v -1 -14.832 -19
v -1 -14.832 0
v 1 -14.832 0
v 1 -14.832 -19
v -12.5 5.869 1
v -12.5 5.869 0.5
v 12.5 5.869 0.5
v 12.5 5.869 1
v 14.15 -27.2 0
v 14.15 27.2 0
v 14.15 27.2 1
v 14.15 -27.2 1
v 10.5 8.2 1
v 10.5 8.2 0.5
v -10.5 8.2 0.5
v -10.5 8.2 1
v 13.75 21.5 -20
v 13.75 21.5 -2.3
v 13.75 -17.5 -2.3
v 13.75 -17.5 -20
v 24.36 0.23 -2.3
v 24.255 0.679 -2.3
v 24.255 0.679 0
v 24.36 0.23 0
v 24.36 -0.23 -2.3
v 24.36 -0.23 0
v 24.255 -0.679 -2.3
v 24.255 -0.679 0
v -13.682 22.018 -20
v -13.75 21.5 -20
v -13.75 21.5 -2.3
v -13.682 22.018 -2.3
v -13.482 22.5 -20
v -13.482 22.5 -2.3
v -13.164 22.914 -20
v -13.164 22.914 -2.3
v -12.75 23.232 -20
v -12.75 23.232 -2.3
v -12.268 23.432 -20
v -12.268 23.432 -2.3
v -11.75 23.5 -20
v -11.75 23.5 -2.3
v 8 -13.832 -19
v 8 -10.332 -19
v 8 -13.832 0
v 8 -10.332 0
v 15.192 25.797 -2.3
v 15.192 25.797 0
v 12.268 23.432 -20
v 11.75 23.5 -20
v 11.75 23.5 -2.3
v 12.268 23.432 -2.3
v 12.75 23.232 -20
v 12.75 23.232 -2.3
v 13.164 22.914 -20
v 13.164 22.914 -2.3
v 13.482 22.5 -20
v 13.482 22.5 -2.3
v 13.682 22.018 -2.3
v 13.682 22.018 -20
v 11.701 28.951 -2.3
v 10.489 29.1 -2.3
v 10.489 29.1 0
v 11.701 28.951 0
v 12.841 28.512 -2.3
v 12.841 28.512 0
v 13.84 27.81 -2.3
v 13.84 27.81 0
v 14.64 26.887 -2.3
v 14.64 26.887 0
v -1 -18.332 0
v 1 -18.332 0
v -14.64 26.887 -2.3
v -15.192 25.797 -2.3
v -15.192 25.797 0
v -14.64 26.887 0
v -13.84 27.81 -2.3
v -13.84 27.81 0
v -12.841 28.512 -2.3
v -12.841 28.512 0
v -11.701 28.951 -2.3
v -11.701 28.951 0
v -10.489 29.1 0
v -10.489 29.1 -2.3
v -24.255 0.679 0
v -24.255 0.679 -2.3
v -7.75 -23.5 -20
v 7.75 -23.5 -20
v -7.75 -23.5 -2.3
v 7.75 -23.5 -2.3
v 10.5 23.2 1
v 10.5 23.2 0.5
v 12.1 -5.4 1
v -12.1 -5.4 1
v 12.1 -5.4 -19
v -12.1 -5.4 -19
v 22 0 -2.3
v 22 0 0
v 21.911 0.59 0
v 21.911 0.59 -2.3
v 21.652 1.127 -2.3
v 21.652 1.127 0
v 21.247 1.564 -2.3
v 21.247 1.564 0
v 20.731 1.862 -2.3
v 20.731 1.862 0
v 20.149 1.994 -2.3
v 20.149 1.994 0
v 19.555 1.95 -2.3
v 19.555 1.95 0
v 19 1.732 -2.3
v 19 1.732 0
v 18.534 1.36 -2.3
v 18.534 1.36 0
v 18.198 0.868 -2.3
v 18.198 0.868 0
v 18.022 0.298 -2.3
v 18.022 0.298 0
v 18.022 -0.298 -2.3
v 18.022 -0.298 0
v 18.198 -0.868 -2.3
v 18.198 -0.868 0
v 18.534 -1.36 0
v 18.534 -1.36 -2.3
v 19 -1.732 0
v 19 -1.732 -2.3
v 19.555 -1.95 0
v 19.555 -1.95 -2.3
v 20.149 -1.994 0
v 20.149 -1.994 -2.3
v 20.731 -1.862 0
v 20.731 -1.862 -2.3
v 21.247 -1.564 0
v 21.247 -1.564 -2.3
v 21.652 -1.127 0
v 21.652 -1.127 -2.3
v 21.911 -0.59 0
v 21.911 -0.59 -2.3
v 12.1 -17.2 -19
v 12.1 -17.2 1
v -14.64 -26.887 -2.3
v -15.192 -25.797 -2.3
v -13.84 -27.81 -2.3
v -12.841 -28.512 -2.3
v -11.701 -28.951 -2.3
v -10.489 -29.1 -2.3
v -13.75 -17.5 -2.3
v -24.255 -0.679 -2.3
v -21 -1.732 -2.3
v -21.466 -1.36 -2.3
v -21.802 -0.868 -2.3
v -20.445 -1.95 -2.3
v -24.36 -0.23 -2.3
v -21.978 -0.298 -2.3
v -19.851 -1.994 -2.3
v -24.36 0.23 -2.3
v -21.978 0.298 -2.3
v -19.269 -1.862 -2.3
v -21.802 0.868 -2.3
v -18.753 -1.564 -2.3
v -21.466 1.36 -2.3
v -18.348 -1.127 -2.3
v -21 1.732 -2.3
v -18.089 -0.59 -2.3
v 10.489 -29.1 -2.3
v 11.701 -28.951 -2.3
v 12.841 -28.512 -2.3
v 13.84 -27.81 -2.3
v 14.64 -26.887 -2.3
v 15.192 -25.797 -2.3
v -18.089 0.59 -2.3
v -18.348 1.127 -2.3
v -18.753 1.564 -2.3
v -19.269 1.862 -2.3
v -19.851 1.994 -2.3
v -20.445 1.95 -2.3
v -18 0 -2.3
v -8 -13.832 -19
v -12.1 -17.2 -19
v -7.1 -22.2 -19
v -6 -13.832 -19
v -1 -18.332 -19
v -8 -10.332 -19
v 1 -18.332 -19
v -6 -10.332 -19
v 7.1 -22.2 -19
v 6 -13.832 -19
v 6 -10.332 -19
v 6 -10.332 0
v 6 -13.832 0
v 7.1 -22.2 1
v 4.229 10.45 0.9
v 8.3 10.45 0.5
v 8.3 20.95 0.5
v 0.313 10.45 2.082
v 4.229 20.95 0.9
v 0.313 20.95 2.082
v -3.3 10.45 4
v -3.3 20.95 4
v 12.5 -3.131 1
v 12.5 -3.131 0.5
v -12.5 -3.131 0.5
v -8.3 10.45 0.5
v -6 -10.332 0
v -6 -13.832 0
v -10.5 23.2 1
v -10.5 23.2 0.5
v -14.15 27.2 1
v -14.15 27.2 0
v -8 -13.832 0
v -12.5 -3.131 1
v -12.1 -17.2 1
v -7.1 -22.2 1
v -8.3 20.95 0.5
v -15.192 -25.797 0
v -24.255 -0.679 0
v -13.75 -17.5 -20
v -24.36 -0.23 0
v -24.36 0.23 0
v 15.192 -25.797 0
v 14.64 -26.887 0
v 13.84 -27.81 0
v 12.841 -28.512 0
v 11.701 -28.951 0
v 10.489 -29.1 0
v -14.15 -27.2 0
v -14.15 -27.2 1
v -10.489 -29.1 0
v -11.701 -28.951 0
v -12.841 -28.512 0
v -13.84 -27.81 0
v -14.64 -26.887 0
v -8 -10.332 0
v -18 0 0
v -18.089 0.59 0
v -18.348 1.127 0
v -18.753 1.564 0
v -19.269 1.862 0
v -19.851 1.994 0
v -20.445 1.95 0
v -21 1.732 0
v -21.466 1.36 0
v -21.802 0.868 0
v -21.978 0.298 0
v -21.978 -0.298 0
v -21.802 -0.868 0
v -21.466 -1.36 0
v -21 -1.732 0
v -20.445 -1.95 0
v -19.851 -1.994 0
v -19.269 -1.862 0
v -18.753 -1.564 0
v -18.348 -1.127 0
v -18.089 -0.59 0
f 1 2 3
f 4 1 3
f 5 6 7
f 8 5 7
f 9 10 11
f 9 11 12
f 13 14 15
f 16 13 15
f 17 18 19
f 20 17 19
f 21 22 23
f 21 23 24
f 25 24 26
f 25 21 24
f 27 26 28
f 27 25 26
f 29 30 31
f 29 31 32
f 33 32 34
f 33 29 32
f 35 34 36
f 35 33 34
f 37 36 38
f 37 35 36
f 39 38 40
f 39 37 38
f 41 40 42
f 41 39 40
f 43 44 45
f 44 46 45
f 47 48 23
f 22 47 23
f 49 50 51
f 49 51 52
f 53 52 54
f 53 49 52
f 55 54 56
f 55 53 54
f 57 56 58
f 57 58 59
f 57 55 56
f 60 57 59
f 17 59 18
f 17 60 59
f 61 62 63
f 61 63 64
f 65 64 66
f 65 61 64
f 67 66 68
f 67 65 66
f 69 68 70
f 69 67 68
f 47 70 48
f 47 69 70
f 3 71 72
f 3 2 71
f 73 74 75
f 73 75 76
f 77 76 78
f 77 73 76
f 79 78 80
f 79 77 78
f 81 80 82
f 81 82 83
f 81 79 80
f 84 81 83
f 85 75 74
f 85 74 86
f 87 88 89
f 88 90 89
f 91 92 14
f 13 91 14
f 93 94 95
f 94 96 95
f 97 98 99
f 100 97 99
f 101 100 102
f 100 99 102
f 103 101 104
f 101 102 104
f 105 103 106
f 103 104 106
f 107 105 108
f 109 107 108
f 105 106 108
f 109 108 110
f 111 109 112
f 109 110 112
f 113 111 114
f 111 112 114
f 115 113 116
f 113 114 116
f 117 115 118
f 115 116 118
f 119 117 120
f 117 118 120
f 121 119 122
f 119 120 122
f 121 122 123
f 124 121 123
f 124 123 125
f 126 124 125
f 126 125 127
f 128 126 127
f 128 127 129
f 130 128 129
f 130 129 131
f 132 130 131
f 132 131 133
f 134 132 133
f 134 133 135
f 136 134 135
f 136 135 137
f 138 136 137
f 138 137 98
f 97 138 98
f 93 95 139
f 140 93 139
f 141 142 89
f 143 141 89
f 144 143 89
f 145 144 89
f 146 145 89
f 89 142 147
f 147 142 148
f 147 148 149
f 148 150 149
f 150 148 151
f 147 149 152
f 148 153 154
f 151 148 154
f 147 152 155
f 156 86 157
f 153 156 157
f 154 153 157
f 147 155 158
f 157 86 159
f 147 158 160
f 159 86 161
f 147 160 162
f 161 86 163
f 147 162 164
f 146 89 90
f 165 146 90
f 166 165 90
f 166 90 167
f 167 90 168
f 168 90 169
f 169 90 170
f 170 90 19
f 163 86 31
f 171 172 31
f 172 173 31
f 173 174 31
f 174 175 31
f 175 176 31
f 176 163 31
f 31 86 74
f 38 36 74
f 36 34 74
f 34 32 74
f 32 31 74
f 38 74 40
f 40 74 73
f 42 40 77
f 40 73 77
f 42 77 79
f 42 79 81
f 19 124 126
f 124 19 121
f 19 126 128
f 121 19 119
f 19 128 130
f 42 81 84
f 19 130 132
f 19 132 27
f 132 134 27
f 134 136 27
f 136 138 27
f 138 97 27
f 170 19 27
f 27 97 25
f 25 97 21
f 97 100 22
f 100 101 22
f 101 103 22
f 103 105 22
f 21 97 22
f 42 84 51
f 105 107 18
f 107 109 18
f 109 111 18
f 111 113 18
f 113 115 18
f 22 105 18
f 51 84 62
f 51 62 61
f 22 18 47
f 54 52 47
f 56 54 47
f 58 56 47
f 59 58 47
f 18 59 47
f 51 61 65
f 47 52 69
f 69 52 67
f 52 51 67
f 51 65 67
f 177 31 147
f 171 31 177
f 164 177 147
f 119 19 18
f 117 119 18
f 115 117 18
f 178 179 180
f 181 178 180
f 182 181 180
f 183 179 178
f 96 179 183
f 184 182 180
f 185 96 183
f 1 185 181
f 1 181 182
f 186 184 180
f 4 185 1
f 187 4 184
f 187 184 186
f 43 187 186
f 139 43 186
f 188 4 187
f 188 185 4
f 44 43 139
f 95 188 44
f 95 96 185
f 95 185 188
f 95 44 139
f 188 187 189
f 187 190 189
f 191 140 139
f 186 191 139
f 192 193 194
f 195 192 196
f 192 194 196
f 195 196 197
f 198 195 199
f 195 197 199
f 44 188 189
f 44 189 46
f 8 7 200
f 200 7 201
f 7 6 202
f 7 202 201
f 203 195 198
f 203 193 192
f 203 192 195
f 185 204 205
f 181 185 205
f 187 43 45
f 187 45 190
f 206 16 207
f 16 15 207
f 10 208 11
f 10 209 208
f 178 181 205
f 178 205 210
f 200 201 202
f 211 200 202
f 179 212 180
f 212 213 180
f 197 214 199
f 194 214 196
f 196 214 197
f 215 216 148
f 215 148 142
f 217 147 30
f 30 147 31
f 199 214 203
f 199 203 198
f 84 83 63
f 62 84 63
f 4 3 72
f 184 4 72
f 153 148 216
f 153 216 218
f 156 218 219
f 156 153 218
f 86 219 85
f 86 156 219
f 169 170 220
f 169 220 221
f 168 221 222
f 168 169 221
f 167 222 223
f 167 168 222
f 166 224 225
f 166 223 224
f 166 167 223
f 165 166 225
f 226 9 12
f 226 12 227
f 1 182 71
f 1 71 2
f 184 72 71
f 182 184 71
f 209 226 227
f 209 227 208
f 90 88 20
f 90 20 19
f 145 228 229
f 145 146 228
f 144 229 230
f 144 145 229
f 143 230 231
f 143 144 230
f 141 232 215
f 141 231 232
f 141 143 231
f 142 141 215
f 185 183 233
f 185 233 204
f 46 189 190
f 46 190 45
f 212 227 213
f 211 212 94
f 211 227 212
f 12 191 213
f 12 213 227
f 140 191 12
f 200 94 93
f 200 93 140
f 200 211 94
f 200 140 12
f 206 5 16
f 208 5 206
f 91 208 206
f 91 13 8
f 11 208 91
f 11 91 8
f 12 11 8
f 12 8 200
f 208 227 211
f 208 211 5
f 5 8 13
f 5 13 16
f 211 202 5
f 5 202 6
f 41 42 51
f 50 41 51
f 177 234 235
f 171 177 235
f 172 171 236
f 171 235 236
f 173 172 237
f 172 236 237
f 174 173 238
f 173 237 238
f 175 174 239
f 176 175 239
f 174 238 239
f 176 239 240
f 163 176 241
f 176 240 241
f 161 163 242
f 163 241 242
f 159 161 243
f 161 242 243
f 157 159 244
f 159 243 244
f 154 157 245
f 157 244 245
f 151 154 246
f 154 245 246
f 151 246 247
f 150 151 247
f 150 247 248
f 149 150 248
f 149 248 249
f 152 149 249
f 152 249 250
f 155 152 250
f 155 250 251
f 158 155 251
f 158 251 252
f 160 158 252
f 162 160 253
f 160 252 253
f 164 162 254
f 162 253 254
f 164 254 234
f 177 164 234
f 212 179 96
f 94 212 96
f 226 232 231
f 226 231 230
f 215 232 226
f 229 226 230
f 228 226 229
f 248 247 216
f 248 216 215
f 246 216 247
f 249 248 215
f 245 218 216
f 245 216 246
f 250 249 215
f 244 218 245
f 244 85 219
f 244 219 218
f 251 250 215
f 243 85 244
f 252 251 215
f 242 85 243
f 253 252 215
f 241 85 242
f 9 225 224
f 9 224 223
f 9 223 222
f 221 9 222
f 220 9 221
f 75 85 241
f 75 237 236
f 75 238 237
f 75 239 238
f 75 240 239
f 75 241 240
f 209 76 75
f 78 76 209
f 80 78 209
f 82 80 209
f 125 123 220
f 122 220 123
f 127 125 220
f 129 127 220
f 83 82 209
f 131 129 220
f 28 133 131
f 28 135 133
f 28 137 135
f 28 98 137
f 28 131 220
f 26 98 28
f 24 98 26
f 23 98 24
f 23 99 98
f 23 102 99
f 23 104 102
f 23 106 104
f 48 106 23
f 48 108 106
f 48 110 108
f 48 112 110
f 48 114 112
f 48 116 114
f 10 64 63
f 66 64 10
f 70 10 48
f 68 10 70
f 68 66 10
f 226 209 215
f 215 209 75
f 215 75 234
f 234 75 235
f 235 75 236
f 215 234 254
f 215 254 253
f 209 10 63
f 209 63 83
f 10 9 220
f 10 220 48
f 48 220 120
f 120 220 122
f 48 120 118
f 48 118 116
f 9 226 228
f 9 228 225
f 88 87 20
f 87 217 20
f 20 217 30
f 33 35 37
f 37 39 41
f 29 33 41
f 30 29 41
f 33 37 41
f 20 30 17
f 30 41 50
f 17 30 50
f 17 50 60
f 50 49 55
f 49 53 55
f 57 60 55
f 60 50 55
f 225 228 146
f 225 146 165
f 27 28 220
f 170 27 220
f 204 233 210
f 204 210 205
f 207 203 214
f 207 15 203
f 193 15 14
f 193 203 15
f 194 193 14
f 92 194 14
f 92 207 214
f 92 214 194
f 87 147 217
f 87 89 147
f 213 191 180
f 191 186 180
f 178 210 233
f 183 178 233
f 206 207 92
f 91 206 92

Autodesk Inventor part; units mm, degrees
ref_plane "YZ Plane" through (0, 0, 0) normal (1, 0, 0) x (0, 1, 0)
ref_plane "XZ Plane" through (0, 0, 0) normal (0, 1, 0) x (-1, 0, 0)
ref_plane "XY Plane" through (0, 0, 0) normal (0, 0, 1) x (1, 0, 0)
sketch "Sketch3" plane through (0, 0, 0) normal (0, 0, 1) x (1, 0, 0)
  line L0 (-13.75, 23.5) -> (13.75, 23.5)
  line L1 (13.75, 23.5) -> (13.75, -23.5)
  line L2 (13.75, -23.5) -> (-13.75, -23.5)
  line L3 (-13.75, -23.5) -> (-13.75, 23.5)
  line L4 (-13.75, 23.5) -> (13.75, -23.5) construction
  line L5 (13.75, 23.5) -> (-13.75, -23.5) construction
  point P0 (0, 0)
  dimension "d17" = 27.5
  dimension "d18" = 47
extrude "Extrusion1" add sketch "Sketch3" against normal blind 20
sketch "Sketch2" plane through (0, 0, 0) normal (0, 0, 1) x (1, 0, 0)
  line L0 (-24.5, 0) -> (24.5, 0) construction
  line L1 (0, 29.1) -> (0, -29.1) construction
  line L2 (-14, 29.1) -> (14, 29.1)
  line L3 (-14, 29.1) -> (-24.5, 0)
  line L4 (14, 29.1) -> (24.5, 0)
  line L5 (-14, -29.1) -> (14, -29.1)
  line L6 (-24.5, 0) -> (-14, -29.1)
  line L7 (24.5, 0) -> (14, -29.1)
  circle A0 centre (20, 0) radius 2
  circle A1 centre (-20, 0) radius 2
  point P0 (0, 0)
  point P1 (0, 0)
  dimension "d12" = 49
  dimension "d13" = 58.2
  dimension "d14" = 28
  dimension "d15" = 4
  dimension "d16" = 40
extrude "Extrusion2" add sketch "Sketch2" against normal blind 2.3
sketch "Sketch1" plane through (0, 0, 0) normal (0, 0, 1) x (1, 0, 0)
  line L0 (-14.15, 27.2) -> (14.15, 27.2)
  line L1 (14.15, 27.2) -> (14.15, -27.2)
  line L2 (14.15, -27.2) -> (-14.15, -27.2)
  line L3 (-14.15, -27.2) -> (-14.15, 27.2)
  line L4 (-14.15, 27.2) -> (14.15, -27.2) construction
  line L5 (14.15, 27.2) -> (-14.15, -27.2) construction
  line L6 (-10.5, 23.2) -> (10.5, 23.2)
  line L7 (10.5, 23.2) -> (10.5, 8.2)
  line L8 (10.5, 8.2) -> (-10.5, 8.2)
  line L9 (-10.5, 8.2) -> (-10.5, 23.2)
  line L10 (-10.5, 23.2) -> (10.5, 8.2) construction
  line L11 (10.5, 23.2) -> (-10.5, 8.2) construction
  line L12 (0, 15.7) -> (0, 0) construction
  line L13 (-12.1, -5.4) -> (12.1, -5.4)
  line L14 (12.1, -5.4) -> (12.1, -22.2)
  line L15 (12.1, -22.2) -> (-12.1, -22.2)
  line L16 (-12.1, -22.2) -> (-12.1, -5.4)
  line L17 (-12.1, -5.4) -> (12.1, -22.2) construction
  line L18 (12.1, -5.4) -> (-12.1, -22.2) construction
  line L19 (0, 0) -> (0, -13.8) construction
  line L20 (-8.3, 20.95) -> (8.3, 20.95)
  line L21 (8.3, 20.95) -> (8.3, 10.45)
  line L22 (8.3, 10.45) -> (-8.3, 10.45)
  line L23 (-8.3, 10.45) -> (-8.3, 20.95)
  line L24 (-8.3, 20.95) -> (8.3, 10.45) construction
  line L25 (8.3, 20.95) -> (-8.3, 10.45) construction
  line L26 (-12.5, 5.8689) -> (12.5, 5.8689)
  line L27 (12.5, 5.8689) -> (12.5, -3.1311)
  line L28 (12.5, -3.1311) -> (-12.5, -3.1311)
  line L29 (-12.5, -3.1311) -> (-12.5, 5.8689)
  line L30 (-12.5, 5.8689) -> (12.5, -3.1311) construction
  line L31 (12.5, 5.8689) -> (-12.5, -3.1311) construction
  point P0 (0, 1.3689)
  dimension "d0" = 28.3
  dimension "d1" = 54.4
  dimension "d2" = 21
  dimension "d3" = 15
  dimension "d4" = 4
  dimension "d5" = 24.2
  dimension "d6" = 16.8
  dimension "d7" = 5
  dimension "d8" = 16.6
  dimension "d9" = 10.5
  dimension "d10" = 25
  dimension "d11" = 9
extrude "Extrusion3" add sketch "Sketch1" along normal blind 1 contours L0 L1 L2 L3
extrude "Extrusion4" add sketch "Sketch1" along normal blind 0.5 contours L6 L7 L8 L9 | L26 L27 L28 L29
extrude "Extrusion5" add sketch "Sketch1" along normal blind 4 contours L20 L21 L22 L23
sketch "Sketch4" plane through (-8.3, 20.95, 0.5) normal (0, 1, 0) x (1, 0, 0)
  line L0 (0, -3.5) -> (16.6, -3.5) projected
  line L1 (0, 0) -> (0, -3.5) projected
  line L2 (16.6, 0) -> (16.6, -3.5) projected
  line L3 (0, 0) -> (5, -3.5)
  arc A0 (16.6, 0) -> (5, -3.5) centre (16.6082, -21) ccw
  point P0 (8.3, 0.5)
  dimension "d29" = 5
  dimension "d30" = 21
extrude "Extrusion6" cut sketch "Sketch4" against normal up to surface (10.5 mm away)
extrude "Extrusion7" cut sketch "Sketch1" against normal blind 19 contours L13 L14 L15 L16
sketch "Sketch5" plane through (0, 0, 0) normal (0, 0, 1) x (1, 0, 0)
  line L0 (-1, -14.8319) -> (1, -14.8319)
  line L1 (1, -14.8319) -> (1, -18.3319)
  line L2 (1, -18.3319) -> (-1, -18.3319)
  line L3 (-1, -18.3319) -> (-1, -14.8319)
  line L4 (-8, -10.3319) -> (-6, -10.3319)
  line L5 (-6, -10.3319) -> (-6, -13.8319)
  line L6 (-6, -13.8319) -> (-8, -13.8319)
  line L7 (-8, -13.8319) -> (-8, -10.3319)
  line L8 (6, -10.3319) -> (8, -10.3319)
  line L9 (8, -10.3319) -> (8, -13.8319)
  line L10 (8, -13.8319) -> (6, -13.8319)
  line L11 (6, -13.8319) -> (6, -10.3319)
  line L12 (-8, -12.0819) -> (8, -12.0819) construction
  line L13 (0, -14.8319) -> (0, -12.0819) construction
  point P0 (0, 0)
  dimension "d35" = 2
  dimension "d36" = 3.5
  dimension "d42" = 16
  dimension "d43" = 8
extrude "Extrusion8" add sketch "Sketch5" against normal up to next
fillet "Fillet1" radius 2 4 edges at (13.75, 23.5, -11.15) (-13.75, 23.5, -11.15) (24.5, 0, -1.15) (-24.5, 0, -1.15)
fillet "Fillet2" radius 5 4 edges at (14, 29.1, -1.15) (-14, 29.1, -1.15) (14, -29.1, -1.15) (-14, -29.1, -1.15)
chamfer "Chamfer1" distance 5 angle 45 2 edges at (12.1, -22.2, -9) (-12.1, -22.2, -9)
chamfer "Chamfer2" distance 6 angle 45 2 edges at (-13.75, -23.5, -11.15) (13.75, -23.5, -11.15)
properties part number "power-port" material "UHMW, Black"
